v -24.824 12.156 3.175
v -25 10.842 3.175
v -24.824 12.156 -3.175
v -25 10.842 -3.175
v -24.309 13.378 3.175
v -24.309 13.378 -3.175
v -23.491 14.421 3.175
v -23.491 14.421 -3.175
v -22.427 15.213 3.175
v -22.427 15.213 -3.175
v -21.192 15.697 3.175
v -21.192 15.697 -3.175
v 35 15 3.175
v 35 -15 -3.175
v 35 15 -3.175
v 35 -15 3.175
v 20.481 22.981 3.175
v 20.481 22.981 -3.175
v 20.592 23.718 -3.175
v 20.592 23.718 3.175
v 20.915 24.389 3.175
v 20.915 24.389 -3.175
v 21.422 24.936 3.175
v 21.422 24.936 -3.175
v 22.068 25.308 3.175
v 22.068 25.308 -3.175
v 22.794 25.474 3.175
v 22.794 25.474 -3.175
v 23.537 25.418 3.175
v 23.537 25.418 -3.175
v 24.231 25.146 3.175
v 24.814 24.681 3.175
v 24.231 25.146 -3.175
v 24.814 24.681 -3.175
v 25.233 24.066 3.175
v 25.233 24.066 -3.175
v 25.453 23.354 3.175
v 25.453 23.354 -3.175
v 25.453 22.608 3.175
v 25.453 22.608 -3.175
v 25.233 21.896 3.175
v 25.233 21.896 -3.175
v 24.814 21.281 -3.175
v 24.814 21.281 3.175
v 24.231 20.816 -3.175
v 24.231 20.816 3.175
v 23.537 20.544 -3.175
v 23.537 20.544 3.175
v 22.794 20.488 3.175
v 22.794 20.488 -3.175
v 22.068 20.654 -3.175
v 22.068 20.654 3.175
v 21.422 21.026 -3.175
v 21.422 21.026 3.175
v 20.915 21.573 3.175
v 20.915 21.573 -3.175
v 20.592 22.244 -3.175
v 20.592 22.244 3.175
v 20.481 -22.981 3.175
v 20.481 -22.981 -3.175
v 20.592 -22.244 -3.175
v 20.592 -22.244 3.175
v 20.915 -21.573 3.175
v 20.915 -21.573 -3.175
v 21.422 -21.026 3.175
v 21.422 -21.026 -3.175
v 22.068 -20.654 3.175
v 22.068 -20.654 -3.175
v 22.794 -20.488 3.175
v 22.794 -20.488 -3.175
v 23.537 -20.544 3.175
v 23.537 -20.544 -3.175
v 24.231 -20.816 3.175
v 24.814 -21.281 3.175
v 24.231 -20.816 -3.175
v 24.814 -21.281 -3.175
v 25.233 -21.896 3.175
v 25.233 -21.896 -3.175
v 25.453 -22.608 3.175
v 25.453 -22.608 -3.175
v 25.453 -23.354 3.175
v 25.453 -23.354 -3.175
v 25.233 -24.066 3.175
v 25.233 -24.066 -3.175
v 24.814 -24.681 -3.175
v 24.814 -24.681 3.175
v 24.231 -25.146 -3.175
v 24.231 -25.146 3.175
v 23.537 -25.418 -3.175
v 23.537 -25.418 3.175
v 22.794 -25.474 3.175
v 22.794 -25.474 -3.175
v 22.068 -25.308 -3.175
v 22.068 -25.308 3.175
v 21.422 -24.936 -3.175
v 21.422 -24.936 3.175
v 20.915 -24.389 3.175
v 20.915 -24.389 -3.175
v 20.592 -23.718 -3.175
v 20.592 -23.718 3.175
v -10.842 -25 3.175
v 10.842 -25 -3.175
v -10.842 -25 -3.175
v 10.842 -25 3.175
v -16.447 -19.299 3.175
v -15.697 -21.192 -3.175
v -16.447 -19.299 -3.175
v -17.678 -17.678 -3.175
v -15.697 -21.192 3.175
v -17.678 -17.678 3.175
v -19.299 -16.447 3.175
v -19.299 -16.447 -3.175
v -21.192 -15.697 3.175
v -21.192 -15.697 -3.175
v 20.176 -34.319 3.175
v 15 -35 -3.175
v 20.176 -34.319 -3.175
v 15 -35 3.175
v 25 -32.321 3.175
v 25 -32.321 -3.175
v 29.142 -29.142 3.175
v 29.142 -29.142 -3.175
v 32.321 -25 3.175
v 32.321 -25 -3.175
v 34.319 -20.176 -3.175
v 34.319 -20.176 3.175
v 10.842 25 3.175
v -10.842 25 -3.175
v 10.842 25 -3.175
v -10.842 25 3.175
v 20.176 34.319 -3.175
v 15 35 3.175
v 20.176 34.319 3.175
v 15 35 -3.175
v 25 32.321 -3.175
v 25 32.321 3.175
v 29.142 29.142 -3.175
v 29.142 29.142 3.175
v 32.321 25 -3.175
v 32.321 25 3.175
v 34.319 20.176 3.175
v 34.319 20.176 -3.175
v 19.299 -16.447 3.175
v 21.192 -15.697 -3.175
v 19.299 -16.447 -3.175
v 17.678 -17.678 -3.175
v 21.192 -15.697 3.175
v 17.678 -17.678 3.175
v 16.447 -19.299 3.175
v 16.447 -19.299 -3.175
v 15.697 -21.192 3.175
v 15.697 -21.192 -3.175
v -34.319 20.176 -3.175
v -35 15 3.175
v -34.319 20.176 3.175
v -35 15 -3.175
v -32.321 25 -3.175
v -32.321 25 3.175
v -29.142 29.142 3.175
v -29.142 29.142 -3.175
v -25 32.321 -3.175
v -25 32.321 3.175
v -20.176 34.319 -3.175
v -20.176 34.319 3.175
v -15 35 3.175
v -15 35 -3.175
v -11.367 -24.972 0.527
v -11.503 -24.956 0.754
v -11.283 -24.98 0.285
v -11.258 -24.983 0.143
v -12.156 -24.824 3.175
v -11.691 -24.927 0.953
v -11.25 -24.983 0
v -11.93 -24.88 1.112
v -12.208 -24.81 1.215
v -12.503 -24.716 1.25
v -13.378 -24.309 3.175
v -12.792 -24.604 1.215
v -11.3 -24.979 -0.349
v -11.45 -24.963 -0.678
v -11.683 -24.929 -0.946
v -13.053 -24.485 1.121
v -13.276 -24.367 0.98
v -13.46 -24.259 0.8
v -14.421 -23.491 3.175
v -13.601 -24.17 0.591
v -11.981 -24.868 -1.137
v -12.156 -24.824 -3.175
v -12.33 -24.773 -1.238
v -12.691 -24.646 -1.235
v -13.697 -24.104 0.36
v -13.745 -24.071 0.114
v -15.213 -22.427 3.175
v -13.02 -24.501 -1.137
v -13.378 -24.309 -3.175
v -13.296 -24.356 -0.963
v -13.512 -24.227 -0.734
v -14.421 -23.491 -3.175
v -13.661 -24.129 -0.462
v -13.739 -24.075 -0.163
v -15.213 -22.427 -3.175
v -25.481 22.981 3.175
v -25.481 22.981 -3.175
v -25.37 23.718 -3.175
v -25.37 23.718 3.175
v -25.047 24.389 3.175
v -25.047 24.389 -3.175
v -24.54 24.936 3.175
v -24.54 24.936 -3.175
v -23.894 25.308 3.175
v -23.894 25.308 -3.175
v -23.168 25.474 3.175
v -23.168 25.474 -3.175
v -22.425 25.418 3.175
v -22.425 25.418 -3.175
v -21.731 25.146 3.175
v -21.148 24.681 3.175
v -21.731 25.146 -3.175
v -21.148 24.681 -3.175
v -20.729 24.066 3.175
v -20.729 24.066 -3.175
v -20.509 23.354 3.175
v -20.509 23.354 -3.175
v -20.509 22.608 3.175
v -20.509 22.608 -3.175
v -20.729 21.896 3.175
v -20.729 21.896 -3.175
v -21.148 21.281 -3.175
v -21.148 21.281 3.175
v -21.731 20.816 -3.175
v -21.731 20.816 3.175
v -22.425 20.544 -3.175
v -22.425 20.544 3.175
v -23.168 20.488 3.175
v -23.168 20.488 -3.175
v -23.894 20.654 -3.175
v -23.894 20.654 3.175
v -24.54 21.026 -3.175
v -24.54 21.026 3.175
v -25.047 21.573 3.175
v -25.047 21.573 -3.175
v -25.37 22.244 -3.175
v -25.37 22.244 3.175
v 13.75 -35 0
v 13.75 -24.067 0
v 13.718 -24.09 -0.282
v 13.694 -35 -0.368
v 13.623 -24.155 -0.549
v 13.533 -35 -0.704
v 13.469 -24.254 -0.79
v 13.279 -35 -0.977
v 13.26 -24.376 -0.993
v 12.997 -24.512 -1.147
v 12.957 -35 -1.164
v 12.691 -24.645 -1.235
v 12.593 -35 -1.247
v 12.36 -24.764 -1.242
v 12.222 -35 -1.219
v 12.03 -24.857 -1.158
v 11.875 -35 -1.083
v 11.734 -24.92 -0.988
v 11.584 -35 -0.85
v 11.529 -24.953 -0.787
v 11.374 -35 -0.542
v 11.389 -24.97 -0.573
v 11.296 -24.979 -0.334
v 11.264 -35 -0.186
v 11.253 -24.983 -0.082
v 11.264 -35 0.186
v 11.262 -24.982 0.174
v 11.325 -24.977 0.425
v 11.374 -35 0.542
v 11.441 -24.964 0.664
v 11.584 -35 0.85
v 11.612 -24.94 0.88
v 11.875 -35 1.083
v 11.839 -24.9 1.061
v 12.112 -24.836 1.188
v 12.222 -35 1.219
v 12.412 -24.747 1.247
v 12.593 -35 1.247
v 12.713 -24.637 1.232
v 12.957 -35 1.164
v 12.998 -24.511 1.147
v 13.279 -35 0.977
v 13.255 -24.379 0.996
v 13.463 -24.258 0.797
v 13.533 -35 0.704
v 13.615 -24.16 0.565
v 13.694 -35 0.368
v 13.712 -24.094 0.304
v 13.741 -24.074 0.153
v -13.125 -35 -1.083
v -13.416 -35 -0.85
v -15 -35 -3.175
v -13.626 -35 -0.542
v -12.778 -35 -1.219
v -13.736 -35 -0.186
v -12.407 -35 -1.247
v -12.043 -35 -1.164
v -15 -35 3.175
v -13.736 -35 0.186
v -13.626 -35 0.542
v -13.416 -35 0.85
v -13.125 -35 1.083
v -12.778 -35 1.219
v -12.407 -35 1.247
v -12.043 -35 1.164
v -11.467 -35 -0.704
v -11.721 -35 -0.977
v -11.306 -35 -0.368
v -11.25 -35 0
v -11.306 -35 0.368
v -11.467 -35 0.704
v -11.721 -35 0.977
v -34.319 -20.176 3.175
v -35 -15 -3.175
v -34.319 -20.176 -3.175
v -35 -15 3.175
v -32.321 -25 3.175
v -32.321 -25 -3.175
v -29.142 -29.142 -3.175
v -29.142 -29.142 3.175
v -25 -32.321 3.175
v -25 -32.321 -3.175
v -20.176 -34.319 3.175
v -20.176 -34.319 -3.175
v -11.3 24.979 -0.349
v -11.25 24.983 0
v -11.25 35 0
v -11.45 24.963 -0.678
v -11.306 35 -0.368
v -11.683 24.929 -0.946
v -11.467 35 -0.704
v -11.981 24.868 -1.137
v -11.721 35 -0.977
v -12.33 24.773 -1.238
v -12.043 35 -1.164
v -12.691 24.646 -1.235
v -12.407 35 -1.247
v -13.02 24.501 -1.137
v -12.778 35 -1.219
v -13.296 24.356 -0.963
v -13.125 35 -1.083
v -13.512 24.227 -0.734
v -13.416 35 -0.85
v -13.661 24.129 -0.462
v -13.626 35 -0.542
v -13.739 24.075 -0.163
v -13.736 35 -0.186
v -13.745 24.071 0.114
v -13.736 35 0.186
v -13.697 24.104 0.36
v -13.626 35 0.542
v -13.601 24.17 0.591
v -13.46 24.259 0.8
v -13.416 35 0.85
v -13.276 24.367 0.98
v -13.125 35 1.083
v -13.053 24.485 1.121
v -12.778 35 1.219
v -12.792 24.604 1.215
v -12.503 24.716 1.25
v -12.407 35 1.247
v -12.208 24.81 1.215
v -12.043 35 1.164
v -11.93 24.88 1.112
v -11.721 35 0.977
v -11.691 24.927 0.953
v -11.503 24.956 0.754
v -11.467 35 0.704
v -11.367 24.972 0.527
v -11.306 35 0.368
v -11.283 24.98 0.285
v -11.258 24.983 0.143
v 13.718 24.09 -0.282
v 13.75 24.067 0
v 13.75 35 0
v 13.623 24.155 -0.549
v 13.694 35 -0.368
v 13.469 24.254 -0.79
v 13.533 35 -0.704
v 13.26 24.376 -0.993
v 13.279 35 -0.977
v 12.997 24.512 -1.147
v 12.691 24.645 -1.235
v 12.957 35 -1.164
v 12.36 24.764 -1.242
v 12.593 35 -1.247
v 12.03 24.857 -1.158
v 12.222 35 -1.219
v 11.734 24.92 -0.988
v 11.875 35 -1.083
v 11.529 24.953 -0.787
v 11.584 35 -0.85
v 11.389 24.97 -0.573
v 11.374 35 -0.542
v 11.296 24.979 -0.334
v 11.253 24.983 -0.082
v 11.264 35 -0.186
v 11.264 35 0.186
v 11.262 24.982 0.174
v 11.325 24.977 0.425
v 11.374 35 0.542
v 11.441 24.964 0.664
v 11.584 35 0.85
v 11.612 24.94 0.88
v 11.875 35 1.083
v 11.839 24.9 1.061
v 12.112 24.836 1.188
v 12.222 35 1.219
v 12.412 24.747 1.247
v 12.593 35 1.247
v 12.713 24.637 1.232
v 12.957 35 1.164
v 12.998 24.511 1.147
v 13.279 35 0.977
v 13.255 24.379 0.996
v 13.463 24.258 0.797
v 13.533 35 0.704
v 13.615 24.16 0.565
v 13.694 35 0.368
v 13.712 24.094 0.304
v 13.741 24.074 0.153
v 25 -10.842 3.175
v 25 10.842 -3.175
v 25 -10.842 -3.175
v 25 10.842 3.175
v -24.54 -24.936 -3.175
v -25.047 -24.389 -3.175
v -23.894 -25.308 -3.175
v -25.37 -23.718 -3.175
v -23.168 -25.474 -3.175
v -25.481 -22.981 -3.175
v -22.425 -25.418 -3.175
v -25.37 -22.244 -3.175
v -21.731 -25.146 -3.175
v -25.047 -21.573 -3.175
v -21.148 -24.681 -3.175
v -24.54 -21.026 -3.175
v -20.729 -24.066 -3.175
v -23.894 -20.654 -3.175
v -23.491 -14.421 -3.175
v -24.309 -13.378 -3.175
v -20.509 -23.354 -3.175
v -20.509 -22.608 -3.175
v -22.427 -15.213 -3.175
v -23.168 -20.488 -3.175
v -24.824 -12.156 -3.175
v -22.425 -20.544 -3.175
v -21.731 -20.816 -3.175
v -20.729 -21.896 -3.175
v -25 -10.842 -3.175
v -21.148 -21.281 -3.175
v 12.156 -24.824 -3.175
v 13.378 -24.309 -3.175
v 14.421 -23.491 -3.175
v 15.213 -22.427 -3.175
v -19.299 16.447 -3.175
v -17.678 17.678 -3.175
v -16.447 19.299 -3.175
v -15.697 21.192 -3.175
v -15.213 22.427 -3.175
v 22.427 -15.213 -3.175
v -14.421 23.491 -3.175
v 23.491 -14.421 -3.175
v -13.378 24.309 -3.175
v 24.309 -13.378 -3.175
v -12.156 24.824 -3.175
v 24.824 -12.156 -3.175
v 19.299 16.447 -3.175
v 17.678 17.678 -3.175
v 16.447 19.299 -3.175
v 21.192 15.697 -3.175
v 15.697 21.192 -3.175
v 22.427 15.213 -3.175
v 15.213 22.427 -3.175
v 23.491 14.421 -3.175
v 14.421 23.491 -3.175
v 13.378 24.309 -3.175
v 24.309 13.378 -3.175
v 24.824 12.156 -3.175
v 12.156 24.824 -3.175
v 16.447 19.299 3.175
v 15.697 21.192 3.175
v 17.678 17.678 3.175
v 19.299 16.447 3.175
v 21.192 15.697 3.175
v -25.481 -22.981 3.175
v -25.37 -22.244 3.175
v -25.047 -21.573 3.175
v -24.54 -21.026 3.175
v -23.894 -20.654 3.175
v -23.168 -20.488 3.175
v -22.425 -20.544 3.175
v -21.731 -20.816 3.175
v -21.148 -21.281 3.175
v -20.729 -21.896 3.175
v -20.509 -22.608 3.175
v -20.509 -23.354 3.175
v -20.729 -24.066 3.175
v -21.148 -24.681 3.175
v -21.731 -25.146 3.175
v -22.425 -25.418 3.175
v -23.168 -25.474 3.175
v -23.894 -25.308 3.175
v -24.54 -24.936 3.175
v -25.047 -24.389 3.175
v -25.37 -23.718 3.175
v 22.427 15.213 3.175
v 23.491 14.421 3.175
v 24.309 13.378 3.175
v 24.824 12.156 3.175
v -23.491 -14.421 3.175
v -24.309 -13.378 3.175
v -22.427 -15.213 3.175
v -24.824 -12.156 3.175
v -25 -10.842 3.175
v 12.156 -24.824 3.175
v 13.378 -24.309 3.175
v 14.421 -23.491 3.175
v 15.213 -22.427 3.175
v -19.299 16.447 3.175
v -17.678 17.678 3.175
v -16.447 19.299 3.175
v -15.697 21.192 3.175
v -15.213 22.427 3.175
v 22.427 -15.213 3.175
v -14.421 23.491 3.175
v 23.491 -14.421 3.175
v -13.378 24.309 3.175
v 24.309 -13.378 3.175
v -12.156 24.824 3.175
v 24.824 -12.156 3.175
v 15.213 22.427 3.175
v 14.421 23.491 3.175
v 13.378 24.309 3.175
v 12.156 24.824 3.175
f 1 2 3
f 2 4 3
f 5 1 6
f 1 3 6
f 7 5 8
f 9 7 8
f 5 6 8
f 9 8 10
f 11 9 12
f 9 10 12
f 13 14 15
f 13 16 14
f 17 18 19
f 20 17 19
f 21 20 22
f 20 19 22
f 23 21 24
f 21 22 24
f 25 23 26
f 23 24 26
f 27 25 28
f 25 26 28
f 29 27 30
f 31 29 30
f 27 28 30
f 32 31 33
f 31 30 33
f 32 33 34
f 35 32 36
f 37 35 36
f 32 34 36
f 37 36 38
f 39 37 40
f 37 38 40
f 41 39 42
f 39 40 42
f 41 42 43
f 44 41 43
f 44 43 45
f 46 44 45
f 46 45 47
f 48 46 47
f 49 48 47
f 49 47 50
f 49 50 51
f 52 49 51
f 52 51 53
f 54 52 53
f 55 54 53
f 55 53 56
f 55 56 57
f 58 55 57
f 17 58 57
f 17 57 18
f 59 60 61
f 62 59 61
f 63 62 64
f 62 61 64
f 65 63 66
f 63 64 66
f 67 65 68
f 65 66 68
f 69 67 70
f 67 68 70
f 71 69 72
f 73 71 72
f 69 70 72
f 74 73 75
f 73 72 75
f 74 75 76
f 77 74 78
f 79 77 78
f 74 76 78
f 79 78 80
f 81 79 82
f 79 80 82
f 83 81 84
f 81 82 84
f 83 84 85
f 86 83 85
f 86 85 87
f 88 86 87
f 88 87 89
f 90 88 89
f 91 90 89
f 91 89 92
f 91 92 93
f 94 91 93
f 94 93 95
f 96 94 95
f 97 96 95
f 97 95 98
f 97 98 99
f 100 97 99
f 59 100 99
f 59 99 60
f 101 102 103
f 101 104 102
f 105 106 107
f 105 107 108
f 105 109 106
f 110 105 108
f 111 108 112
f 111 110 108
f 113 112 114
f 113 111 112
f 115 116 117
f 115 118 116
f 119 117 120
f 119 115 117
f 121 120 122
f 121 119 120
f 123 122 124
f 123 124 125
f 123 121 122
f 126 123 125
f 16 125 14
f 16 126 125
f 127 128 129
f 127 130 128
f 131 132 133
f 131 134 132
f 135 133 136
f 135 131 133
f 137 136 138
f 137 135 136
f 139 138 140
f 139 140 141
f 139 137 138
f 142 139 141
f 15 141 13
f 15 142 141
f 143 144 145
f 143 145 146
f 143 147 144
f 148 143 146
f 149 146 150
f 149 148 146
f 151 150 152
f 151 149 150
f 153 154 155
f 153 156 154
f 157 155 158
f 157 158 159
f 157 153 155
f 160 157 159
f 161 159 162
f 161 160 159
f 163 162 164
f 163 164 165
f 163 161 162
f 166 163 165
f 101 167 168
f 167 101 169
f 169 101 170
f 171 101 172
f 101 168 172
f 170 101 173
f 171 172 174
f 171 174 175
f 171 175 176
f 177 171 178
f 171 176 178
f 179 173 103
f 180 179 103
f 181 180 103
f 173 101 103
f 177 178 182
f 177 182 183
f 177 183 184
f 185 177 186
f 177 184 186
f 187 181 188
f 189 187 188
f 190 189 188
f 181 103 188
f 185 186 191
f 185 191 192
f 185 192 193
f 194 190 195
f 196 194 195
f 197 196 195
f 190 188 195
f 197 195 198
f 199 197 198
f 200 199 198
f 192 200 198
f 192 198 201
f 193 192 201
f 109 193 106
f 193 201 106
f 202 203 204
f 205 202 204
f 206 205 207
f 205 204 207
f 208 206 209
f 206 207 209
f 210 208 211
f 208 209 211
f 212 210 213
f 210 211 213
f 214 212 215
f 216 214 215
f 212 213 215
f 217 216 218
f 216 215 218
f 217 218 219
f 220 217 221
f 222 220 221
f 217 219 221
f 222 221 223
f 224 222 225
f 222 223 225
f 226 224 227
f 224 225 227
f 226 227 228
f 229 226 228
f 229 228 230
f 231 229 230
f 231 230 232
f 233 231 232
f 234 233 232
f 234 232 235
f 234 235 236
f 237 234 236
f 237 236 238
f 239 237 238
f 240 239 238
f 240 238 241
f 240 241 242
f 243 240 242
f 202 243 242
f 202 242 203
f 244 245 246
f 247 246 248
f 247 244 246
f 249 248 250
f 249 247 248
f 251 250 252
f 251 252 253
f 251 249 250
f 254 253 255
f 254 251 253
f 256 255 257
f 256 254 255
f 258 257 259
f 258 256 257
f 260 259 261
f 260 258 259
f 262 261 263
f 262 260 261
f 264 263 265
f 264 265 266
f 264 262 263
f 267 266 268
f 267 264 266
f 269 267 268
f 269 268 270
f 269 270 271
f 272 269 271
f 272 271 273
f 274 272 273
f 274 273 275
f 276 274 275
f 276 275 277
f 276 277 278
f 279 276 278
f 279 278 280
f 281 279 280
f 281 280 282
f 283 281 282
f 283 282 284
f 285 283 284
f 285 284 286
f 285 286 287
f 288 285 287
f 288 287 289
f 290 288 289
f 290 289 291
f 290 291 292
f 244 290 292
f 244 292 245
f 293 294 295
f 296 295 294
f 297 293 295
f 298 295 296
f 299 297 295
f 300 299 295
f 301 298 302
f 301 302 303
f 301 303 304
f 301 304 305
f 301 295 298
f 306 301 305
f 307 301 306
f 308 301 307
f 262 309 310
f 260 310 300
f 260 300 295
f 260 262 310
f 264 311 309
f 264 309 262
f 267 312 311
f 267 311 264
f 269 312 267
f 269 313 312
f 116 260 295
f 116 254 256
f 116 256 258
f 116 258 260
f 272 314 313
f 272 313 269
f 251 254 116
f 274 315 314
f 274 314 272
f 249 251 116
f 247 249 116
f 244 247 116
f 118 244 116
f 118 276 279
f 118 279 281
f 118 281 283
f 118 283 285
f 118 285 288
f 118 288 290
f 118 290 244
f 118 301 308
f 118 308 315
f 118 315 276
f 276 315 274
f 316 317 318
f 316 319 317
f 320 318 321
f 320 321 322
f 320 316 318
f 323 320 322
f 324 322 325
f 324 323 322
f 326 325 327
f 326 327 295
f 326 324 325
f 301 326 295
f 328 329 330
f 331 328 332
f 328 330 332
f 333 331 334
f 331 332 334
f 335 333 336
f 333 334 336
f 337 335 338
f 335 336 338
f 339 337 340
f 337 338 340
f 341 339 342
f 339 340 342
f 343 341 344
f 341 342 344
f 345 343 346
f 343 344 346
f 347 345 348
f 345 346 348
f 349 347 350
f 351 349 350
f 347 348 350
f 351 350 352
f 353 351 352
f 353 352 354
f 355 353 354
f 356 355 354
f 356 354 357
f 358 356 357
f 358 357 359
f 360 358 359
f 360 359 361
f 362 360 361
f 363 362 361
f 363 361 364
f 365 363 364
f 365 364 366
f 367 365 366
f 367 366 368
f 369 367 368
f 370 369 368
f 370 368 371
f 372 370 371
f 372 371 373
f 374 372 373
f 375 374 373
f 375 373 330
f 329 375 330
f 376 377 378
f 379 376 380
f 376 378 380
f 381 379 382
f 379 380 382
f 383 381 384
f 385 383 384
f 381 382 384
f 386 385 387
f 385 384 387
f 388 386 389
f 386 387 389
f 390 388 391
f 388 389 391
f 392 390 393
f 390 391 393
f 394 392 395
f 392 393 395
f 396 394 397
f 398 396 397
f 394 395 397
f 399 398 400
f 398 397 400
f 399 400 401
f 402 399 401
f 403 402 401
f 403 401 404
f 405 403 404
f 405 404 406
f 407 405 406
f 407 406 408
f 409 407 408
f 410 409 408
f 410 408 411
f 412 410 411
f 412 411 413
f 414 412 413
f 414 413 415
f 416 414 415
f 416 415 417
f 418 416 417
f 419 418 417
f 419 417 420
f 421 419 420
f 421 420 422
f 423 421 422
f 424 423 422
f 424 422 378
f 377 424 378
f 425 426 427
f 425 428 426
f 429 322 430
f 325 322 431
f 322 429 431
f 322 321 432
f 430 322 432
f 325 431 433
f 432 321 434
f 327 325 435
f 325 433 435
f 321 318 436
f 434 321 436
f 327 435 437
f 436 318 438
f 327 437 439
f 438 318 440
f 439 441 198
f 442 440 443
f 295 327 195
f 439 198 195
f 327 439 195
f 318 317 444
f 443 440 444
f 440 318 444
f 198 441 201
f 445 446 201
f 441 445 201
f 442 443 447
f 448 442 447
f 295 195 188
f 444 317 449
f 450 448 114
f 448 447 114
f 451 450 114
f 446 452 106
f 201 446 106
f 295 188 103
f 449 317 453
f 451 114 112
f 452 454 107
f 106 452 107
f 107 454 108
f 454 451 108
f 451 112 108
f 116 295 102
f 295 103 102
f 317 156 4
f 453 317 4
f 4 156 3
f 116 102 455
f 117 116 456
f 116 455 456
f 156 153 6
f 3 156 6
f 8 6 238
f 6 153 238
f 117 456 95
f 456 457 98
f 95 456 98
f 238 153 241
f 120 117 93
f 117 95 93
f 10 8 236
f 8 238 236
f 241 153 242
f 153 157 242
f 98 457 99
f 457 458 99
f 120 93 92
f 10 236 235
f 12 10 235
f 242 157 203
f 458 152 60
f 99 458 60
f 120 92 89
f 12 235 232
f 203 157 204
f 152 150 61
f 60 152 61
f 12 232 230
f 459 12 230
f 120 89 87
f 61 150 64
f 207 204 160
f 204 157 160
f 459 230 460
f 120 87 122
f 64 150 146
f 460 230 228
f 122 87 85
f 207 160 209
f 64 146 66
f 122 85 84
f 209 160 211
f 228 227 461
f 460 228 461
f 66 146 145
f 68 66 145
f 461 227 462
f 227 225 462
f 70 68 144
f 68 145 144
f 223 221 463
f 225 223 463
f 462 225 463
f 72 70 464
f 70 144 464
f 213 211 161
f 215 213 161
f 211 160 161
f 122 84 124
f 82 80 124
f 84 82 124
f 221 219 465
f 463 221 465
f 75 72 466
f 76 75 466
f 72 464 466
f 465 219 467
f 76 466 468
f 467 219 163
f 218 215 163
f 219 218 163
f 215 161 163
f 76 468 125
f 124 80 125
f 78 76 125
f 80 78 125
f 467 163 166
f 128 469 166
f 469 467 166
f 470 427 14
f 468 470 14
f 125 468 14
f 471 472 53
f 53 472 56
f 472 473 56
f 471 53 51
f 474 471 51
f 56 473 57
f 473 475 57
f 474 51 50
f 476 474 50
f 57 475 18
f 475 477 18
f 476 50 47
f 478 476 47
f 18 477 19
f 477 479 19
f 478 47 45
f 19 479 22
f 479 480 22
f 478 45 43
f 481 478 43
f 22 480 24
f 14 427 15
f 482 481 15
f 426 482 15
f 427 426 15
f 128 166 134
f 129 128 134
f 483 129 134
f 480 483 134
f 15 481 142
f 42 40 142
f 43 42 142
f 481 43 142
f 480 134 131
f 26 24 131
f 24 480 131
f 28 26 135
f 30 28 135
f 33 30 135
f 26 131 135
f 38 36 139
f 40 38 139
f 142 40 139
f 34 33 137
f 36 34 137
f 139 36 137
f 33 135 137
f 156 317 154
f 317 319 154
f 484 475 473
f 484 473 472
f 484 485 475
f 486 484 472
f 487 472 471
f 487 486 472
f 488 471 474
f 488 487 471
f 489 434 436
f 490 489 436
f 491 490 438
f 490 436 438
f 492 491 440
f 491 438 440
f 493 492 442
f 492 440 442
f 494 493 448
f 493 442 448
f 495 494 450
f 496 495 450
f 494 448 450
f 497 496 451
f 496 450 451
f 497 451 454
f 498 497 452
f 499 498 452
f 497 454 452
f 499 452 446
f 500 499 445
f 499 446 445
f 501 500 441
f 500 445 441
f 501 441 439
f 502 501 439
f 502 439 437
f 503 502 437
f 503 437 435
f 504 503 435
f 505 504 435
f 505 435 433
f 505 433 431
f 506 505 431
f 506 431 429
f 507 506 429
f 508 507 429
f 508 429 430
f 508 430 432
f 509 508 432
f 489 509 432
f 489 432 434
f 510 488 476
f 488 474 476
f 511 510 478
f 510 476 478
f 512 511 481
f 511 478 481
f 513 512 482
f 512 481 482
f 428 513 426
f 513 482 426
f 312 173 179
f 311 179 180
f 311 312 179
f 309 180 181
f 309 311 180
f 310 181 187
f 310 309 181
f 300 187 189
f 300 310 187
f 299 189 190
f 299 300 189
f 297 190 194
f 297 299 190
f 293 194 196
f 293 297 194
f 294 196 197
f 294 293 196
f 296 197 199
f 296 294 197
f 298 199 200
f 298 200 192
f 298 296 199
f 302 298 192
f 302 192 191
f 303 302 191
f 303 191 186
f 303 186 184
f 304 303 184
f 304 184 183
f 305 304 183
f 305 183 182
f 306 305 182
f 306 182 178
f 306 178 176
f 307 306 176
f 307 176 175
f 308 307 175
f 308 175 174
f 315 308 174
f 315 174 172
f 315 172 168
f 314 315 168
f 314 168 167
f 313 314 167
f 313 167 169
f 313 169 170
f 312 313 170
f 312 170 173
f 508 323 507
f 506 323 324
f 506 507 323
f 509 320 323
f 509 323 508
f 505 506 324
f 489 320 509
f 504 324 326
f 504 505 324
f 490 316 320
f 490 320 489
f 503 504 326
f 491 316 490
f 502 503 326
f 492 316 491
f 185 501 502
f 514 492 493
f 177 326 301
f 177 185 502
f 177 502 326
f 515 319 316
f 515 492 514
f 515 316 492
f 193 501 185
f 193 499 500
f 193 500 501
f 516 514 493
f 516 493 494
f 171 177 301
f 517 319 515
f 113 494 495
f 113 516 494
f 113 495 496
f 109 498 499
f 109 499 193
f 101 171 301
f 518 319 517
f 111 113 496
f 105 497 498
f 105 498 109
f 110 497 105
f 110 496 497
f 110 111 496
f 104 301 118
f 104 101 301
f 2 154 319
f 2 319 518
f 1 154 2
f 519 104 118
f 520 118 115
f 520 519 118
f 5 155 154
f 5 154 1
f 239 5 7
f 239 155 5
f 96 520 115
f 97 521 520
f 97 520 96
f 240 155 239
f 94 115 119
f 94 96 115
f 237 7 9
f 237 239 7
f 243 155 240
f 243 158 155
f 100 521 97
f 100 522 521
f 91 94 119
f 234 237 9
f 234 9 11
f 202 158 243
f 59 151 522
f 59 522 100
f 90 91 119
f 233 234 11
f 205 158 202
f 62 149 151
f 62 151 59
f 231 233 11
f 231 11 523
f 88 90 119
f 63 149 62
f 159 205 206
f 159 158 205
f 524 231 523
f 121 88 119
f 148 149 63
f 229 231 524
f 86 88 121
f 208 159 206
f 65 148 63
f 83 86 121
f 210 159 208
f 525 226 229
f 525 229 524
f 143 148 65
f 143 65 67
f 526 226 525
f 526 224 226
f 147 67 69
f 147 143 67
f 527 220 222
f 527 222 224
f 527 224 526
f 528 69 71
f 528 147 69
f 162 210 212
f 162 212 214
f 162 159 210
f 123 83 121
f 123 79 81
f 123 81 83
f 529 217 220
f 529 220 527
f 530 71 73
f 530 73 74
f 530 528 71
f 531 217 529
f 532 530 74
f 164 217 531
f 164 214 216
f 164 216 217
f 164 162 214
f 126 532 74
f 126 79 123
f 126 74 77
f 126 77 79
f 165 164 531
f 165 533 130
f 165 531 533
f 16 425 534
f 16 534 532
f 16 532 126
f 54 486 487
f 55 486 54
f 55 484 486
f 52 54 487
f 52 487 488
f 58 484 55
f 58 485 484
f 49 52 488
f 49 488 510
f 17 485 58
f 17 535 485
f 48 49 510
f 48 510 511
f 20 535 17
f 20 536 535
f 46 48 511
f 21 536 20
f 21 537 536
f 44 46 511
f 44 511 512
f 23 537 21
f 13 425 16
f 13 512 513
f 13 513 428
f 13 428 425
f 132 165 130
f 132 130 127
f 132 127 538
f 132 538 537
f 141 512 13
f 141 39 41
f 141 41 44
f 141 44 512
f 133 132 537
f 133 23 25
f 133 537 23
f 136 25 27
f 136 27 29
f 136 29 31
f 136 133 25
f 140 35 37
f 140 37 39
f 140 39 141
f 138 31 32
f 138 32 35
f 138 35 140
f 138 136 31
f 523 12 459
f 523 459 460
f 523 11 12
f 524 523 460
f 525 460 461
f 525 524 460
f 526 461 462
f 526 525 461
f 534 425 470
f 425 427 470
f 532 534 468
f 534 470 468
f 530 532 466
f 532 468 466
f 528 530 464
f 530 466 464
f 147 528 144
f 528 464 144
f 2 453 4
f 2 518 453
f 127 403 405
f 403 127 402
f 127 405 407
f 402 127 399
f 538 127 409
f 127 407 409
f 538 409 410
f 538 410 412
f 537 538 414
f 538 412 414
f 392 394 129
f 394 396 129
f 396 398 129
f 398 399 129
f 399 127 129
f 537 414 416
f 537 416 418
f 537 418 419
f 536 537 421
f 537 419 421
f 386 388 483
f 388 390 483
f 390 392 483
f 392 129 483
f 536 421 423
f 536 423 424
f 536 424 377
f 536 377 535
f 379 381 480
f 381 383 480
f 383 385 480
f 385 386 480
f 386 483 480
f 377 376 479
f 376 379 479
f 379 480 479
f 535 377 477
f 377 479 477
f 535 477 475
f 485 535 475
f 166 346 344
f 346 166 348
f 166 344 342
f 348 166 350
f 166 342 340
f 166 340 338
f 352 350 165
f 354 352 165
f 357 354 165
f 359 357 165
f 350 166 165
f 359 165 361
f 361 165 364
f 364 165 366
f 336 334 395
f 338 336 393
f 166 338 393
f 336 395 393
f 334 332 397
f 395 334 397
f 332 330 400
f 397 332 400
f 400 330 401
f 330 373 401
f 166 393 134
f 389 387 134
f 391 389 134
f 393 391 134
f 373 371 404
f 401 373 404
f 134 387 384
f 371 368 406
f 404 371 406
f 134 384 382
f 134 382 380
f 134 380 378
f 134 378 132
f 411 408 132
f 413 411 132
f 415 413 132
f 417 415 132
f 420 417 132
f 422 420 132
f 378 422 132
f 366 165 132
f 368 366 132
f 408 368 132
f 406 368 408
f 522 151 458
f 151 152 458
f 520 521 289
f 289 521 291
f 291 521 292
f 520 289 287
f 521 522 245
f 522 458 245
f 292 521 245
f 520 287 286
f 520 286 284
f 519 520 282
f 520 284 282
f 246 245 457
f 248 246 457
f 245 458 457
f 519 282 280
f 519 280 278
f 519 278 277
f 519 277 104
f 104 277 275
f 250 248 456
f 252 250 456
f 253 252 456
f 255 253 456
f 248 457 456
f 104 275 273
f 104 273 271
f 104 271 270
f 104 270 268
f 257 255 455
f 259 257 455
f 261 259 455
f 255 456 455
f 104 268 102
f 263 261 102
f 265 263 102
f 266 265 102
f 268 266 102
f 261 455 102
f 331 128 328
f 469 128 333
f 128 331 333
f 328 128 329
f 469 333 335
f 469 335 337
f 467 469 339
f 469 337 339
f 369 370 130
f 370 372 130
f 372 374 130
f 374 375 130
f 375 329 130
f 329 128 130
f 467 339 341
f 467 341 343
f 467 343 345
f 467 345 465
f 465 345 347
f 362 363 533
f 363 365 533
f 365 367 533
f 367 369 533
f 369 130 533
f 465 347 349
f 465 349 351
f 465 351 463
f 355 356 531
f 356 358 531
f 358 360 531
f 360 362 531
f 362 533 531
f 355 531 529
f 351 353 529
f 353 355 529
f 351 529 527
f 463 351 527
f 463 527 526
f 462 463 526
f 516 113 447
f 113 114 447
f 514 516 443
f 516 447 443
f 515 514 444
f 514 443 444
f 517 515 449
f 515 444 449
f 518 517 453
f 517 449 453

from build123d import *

# Parameters (mm, degrees)
SKETCH1_W                             = 70
SKETCH1_H                             = 70
F_125_IN_SHEET_DEPTH                  = 3.175
FILLET1_R                             = 5
FILLET2_R                             = 20
F_5_0_REAMED_OVER_FOR_SHOULDER_BOLT_D = 5
M3X0_5_TAPPED_HOLE1_REACH             = 80.327
M3X0_5_TAPPED_HOLE1_BORE_R            = 1.25


with BuildPart() as part:
    # Sketch1 → .125 in sheet (new, symmetric)
    with BuildSketch(Plane.XY):
        Rectangle(SKETCH1_W, SKETCH1_H)
        with BuildLine():
            Line((-15.75784645, 25), (15.75784645, 25))
            ThreePointArc((15.75784645, 25), (17.67766953, 17.67766953), (25, 15.75784645))
            Line((25, 15.75784645), (25, -15.75784645))
            ThreePointArc((25, -15.75784645), (17.67766953, -17.67766953), (15.75784645, -25))
            Line((15.75784645, -25), (-15.75784645, -25))
            ThreePointArc((-15.75784645, -25), (-17.67766953, -17.67766953), (-25, -15.75784645))
            Line((-25, -15.75784645), (-25, 15.75784645))
            ThreePointArc((-25, 15.75784645), (-17.67766953, 17.67766953), (-15.75784645, 25))
        make_face(mode=Mode.SUBTRACT)
    extrude(amount=F_125_IN_SHEET_DEPTH, both=True)

    # Fillet1
    fillet1_edges = [part.edges().sort_by_distance(p)[0] for p in [
        (25, 15.75784645, 0),
        (15.75784645, 25, 0),
        (-15.75784645, 25, 0),
        (-25, 15.75784645, 0),
        (-25, -15.75784645, 0),
        (-15.75784645, -25, 0),
        (15.75784645, -25, 0),
        (25, -15.75784645, 0),
    ]]
    fillet(fillet1_edges, radius=FILLET1_R)

    # Fillet2
    fillet2_edges = [part.edges().sort_by_distance(p)[0] for p in [
        (-35, -35, 0),
        (-35, 35, 0),
        (35, 35, 0),
        (35, -35, 0),
    ]]
    fillet(fillet2_edges, radius=FILLET2_R)

    # Ø5.0 Reamed over for shoulder bolt (through all)
    with Locations(Plane(origin=(-38.607659372, 4.370839302, 3.175), x_dir=(1, 0, 0), z_dir=(0, 0, 1))):
        with Locations((15.626688983, 18.610131087), (61.58862976, 18.610131087), (61.58862976, -27.35180969), (15.626688983, -27.35180969)):
            Hole(F_5_0_REAMED_OVER_FOR_SHOULDER_BOLT_D / 2)

    # M3x0.5 Tapped Hole1 bore → M3x0.5 Tapped Hole1 (cut, up to next)
    with BuildSketch(Plane(origin=(0, 35, 0), x_dir=(1, 0, 0), z_dir=(0, 1, 0)), mode=Mode.PRIVATE) as m3x0_5_tapped_hole1_sk1:
        with Locations((-12.5, 0)):
            Circle(M3X0_5_TAPPED_HOLE1_BORE_R)
    m3x0_5_tapped_hole1_tool1 = extrude(m3x0_5_tapped_hole1_sk1.sketch, amount=-M3X0_5_TAPPED_HOLE1_REACH, mode=Mode.PRIVATE) & part.part
    # M3x0.5 Tapped Hole1 bore → M3x0.5 Tapped Hole1 (cut, up to next)
    with BuildSketch(Plane(origin=(0, 35, 0), x_dir=(1, 0, 0), z_dir=(0, 1, 0)), mode=Mode.PRIVATE) as m3x0_5_tapped_hole1_sk2:
        with Locations((12.5, 0)):
            Circle(M3X0_5_TAPPED_HOLE1_BORE_R)
    m3x0_5_tapped_hole1_tool2 = extrude(m3x0_5_tapped_hole1_sk2.sketch, amount=-M3X0_5_TAPPED_HOLE1_REACH, mode=Mode.PRIVATE) & part.part
    m3x0_5_tapped_hole1_1 = m3x0_5_tapped_hole1_tool1.solids().sort_by_distance((-12.5, 35, 0))[0]
    add(m3x0_5_tapped_hole1_1, mode=Mode.SUBTRACT)
    m3x0_5_tapped_hole1_2 = m3x0_5_tapped_hole1_tool2.solids().sort_by_distance((12.5, 35, 0))[0]
    add(m3x0_5_tapped_hole1_2, mode=Mode.SUBTRACT)
    m3x0_5_tapped_hole1 = m3x0_5_tapped_hole1_1 + m3x0_5_tapped_hole1_2  # M3x0.5 Tapped Hole1 as one shape, for the pattern or mirror that repeats it

    # Mirror1: M3x0.5 Tapped Hole1 across plane
    add(m3x0_5_tapped_hole1.mirror(Plane.ZX), mode=Mode.SUBTRACT)


solid = part.part
